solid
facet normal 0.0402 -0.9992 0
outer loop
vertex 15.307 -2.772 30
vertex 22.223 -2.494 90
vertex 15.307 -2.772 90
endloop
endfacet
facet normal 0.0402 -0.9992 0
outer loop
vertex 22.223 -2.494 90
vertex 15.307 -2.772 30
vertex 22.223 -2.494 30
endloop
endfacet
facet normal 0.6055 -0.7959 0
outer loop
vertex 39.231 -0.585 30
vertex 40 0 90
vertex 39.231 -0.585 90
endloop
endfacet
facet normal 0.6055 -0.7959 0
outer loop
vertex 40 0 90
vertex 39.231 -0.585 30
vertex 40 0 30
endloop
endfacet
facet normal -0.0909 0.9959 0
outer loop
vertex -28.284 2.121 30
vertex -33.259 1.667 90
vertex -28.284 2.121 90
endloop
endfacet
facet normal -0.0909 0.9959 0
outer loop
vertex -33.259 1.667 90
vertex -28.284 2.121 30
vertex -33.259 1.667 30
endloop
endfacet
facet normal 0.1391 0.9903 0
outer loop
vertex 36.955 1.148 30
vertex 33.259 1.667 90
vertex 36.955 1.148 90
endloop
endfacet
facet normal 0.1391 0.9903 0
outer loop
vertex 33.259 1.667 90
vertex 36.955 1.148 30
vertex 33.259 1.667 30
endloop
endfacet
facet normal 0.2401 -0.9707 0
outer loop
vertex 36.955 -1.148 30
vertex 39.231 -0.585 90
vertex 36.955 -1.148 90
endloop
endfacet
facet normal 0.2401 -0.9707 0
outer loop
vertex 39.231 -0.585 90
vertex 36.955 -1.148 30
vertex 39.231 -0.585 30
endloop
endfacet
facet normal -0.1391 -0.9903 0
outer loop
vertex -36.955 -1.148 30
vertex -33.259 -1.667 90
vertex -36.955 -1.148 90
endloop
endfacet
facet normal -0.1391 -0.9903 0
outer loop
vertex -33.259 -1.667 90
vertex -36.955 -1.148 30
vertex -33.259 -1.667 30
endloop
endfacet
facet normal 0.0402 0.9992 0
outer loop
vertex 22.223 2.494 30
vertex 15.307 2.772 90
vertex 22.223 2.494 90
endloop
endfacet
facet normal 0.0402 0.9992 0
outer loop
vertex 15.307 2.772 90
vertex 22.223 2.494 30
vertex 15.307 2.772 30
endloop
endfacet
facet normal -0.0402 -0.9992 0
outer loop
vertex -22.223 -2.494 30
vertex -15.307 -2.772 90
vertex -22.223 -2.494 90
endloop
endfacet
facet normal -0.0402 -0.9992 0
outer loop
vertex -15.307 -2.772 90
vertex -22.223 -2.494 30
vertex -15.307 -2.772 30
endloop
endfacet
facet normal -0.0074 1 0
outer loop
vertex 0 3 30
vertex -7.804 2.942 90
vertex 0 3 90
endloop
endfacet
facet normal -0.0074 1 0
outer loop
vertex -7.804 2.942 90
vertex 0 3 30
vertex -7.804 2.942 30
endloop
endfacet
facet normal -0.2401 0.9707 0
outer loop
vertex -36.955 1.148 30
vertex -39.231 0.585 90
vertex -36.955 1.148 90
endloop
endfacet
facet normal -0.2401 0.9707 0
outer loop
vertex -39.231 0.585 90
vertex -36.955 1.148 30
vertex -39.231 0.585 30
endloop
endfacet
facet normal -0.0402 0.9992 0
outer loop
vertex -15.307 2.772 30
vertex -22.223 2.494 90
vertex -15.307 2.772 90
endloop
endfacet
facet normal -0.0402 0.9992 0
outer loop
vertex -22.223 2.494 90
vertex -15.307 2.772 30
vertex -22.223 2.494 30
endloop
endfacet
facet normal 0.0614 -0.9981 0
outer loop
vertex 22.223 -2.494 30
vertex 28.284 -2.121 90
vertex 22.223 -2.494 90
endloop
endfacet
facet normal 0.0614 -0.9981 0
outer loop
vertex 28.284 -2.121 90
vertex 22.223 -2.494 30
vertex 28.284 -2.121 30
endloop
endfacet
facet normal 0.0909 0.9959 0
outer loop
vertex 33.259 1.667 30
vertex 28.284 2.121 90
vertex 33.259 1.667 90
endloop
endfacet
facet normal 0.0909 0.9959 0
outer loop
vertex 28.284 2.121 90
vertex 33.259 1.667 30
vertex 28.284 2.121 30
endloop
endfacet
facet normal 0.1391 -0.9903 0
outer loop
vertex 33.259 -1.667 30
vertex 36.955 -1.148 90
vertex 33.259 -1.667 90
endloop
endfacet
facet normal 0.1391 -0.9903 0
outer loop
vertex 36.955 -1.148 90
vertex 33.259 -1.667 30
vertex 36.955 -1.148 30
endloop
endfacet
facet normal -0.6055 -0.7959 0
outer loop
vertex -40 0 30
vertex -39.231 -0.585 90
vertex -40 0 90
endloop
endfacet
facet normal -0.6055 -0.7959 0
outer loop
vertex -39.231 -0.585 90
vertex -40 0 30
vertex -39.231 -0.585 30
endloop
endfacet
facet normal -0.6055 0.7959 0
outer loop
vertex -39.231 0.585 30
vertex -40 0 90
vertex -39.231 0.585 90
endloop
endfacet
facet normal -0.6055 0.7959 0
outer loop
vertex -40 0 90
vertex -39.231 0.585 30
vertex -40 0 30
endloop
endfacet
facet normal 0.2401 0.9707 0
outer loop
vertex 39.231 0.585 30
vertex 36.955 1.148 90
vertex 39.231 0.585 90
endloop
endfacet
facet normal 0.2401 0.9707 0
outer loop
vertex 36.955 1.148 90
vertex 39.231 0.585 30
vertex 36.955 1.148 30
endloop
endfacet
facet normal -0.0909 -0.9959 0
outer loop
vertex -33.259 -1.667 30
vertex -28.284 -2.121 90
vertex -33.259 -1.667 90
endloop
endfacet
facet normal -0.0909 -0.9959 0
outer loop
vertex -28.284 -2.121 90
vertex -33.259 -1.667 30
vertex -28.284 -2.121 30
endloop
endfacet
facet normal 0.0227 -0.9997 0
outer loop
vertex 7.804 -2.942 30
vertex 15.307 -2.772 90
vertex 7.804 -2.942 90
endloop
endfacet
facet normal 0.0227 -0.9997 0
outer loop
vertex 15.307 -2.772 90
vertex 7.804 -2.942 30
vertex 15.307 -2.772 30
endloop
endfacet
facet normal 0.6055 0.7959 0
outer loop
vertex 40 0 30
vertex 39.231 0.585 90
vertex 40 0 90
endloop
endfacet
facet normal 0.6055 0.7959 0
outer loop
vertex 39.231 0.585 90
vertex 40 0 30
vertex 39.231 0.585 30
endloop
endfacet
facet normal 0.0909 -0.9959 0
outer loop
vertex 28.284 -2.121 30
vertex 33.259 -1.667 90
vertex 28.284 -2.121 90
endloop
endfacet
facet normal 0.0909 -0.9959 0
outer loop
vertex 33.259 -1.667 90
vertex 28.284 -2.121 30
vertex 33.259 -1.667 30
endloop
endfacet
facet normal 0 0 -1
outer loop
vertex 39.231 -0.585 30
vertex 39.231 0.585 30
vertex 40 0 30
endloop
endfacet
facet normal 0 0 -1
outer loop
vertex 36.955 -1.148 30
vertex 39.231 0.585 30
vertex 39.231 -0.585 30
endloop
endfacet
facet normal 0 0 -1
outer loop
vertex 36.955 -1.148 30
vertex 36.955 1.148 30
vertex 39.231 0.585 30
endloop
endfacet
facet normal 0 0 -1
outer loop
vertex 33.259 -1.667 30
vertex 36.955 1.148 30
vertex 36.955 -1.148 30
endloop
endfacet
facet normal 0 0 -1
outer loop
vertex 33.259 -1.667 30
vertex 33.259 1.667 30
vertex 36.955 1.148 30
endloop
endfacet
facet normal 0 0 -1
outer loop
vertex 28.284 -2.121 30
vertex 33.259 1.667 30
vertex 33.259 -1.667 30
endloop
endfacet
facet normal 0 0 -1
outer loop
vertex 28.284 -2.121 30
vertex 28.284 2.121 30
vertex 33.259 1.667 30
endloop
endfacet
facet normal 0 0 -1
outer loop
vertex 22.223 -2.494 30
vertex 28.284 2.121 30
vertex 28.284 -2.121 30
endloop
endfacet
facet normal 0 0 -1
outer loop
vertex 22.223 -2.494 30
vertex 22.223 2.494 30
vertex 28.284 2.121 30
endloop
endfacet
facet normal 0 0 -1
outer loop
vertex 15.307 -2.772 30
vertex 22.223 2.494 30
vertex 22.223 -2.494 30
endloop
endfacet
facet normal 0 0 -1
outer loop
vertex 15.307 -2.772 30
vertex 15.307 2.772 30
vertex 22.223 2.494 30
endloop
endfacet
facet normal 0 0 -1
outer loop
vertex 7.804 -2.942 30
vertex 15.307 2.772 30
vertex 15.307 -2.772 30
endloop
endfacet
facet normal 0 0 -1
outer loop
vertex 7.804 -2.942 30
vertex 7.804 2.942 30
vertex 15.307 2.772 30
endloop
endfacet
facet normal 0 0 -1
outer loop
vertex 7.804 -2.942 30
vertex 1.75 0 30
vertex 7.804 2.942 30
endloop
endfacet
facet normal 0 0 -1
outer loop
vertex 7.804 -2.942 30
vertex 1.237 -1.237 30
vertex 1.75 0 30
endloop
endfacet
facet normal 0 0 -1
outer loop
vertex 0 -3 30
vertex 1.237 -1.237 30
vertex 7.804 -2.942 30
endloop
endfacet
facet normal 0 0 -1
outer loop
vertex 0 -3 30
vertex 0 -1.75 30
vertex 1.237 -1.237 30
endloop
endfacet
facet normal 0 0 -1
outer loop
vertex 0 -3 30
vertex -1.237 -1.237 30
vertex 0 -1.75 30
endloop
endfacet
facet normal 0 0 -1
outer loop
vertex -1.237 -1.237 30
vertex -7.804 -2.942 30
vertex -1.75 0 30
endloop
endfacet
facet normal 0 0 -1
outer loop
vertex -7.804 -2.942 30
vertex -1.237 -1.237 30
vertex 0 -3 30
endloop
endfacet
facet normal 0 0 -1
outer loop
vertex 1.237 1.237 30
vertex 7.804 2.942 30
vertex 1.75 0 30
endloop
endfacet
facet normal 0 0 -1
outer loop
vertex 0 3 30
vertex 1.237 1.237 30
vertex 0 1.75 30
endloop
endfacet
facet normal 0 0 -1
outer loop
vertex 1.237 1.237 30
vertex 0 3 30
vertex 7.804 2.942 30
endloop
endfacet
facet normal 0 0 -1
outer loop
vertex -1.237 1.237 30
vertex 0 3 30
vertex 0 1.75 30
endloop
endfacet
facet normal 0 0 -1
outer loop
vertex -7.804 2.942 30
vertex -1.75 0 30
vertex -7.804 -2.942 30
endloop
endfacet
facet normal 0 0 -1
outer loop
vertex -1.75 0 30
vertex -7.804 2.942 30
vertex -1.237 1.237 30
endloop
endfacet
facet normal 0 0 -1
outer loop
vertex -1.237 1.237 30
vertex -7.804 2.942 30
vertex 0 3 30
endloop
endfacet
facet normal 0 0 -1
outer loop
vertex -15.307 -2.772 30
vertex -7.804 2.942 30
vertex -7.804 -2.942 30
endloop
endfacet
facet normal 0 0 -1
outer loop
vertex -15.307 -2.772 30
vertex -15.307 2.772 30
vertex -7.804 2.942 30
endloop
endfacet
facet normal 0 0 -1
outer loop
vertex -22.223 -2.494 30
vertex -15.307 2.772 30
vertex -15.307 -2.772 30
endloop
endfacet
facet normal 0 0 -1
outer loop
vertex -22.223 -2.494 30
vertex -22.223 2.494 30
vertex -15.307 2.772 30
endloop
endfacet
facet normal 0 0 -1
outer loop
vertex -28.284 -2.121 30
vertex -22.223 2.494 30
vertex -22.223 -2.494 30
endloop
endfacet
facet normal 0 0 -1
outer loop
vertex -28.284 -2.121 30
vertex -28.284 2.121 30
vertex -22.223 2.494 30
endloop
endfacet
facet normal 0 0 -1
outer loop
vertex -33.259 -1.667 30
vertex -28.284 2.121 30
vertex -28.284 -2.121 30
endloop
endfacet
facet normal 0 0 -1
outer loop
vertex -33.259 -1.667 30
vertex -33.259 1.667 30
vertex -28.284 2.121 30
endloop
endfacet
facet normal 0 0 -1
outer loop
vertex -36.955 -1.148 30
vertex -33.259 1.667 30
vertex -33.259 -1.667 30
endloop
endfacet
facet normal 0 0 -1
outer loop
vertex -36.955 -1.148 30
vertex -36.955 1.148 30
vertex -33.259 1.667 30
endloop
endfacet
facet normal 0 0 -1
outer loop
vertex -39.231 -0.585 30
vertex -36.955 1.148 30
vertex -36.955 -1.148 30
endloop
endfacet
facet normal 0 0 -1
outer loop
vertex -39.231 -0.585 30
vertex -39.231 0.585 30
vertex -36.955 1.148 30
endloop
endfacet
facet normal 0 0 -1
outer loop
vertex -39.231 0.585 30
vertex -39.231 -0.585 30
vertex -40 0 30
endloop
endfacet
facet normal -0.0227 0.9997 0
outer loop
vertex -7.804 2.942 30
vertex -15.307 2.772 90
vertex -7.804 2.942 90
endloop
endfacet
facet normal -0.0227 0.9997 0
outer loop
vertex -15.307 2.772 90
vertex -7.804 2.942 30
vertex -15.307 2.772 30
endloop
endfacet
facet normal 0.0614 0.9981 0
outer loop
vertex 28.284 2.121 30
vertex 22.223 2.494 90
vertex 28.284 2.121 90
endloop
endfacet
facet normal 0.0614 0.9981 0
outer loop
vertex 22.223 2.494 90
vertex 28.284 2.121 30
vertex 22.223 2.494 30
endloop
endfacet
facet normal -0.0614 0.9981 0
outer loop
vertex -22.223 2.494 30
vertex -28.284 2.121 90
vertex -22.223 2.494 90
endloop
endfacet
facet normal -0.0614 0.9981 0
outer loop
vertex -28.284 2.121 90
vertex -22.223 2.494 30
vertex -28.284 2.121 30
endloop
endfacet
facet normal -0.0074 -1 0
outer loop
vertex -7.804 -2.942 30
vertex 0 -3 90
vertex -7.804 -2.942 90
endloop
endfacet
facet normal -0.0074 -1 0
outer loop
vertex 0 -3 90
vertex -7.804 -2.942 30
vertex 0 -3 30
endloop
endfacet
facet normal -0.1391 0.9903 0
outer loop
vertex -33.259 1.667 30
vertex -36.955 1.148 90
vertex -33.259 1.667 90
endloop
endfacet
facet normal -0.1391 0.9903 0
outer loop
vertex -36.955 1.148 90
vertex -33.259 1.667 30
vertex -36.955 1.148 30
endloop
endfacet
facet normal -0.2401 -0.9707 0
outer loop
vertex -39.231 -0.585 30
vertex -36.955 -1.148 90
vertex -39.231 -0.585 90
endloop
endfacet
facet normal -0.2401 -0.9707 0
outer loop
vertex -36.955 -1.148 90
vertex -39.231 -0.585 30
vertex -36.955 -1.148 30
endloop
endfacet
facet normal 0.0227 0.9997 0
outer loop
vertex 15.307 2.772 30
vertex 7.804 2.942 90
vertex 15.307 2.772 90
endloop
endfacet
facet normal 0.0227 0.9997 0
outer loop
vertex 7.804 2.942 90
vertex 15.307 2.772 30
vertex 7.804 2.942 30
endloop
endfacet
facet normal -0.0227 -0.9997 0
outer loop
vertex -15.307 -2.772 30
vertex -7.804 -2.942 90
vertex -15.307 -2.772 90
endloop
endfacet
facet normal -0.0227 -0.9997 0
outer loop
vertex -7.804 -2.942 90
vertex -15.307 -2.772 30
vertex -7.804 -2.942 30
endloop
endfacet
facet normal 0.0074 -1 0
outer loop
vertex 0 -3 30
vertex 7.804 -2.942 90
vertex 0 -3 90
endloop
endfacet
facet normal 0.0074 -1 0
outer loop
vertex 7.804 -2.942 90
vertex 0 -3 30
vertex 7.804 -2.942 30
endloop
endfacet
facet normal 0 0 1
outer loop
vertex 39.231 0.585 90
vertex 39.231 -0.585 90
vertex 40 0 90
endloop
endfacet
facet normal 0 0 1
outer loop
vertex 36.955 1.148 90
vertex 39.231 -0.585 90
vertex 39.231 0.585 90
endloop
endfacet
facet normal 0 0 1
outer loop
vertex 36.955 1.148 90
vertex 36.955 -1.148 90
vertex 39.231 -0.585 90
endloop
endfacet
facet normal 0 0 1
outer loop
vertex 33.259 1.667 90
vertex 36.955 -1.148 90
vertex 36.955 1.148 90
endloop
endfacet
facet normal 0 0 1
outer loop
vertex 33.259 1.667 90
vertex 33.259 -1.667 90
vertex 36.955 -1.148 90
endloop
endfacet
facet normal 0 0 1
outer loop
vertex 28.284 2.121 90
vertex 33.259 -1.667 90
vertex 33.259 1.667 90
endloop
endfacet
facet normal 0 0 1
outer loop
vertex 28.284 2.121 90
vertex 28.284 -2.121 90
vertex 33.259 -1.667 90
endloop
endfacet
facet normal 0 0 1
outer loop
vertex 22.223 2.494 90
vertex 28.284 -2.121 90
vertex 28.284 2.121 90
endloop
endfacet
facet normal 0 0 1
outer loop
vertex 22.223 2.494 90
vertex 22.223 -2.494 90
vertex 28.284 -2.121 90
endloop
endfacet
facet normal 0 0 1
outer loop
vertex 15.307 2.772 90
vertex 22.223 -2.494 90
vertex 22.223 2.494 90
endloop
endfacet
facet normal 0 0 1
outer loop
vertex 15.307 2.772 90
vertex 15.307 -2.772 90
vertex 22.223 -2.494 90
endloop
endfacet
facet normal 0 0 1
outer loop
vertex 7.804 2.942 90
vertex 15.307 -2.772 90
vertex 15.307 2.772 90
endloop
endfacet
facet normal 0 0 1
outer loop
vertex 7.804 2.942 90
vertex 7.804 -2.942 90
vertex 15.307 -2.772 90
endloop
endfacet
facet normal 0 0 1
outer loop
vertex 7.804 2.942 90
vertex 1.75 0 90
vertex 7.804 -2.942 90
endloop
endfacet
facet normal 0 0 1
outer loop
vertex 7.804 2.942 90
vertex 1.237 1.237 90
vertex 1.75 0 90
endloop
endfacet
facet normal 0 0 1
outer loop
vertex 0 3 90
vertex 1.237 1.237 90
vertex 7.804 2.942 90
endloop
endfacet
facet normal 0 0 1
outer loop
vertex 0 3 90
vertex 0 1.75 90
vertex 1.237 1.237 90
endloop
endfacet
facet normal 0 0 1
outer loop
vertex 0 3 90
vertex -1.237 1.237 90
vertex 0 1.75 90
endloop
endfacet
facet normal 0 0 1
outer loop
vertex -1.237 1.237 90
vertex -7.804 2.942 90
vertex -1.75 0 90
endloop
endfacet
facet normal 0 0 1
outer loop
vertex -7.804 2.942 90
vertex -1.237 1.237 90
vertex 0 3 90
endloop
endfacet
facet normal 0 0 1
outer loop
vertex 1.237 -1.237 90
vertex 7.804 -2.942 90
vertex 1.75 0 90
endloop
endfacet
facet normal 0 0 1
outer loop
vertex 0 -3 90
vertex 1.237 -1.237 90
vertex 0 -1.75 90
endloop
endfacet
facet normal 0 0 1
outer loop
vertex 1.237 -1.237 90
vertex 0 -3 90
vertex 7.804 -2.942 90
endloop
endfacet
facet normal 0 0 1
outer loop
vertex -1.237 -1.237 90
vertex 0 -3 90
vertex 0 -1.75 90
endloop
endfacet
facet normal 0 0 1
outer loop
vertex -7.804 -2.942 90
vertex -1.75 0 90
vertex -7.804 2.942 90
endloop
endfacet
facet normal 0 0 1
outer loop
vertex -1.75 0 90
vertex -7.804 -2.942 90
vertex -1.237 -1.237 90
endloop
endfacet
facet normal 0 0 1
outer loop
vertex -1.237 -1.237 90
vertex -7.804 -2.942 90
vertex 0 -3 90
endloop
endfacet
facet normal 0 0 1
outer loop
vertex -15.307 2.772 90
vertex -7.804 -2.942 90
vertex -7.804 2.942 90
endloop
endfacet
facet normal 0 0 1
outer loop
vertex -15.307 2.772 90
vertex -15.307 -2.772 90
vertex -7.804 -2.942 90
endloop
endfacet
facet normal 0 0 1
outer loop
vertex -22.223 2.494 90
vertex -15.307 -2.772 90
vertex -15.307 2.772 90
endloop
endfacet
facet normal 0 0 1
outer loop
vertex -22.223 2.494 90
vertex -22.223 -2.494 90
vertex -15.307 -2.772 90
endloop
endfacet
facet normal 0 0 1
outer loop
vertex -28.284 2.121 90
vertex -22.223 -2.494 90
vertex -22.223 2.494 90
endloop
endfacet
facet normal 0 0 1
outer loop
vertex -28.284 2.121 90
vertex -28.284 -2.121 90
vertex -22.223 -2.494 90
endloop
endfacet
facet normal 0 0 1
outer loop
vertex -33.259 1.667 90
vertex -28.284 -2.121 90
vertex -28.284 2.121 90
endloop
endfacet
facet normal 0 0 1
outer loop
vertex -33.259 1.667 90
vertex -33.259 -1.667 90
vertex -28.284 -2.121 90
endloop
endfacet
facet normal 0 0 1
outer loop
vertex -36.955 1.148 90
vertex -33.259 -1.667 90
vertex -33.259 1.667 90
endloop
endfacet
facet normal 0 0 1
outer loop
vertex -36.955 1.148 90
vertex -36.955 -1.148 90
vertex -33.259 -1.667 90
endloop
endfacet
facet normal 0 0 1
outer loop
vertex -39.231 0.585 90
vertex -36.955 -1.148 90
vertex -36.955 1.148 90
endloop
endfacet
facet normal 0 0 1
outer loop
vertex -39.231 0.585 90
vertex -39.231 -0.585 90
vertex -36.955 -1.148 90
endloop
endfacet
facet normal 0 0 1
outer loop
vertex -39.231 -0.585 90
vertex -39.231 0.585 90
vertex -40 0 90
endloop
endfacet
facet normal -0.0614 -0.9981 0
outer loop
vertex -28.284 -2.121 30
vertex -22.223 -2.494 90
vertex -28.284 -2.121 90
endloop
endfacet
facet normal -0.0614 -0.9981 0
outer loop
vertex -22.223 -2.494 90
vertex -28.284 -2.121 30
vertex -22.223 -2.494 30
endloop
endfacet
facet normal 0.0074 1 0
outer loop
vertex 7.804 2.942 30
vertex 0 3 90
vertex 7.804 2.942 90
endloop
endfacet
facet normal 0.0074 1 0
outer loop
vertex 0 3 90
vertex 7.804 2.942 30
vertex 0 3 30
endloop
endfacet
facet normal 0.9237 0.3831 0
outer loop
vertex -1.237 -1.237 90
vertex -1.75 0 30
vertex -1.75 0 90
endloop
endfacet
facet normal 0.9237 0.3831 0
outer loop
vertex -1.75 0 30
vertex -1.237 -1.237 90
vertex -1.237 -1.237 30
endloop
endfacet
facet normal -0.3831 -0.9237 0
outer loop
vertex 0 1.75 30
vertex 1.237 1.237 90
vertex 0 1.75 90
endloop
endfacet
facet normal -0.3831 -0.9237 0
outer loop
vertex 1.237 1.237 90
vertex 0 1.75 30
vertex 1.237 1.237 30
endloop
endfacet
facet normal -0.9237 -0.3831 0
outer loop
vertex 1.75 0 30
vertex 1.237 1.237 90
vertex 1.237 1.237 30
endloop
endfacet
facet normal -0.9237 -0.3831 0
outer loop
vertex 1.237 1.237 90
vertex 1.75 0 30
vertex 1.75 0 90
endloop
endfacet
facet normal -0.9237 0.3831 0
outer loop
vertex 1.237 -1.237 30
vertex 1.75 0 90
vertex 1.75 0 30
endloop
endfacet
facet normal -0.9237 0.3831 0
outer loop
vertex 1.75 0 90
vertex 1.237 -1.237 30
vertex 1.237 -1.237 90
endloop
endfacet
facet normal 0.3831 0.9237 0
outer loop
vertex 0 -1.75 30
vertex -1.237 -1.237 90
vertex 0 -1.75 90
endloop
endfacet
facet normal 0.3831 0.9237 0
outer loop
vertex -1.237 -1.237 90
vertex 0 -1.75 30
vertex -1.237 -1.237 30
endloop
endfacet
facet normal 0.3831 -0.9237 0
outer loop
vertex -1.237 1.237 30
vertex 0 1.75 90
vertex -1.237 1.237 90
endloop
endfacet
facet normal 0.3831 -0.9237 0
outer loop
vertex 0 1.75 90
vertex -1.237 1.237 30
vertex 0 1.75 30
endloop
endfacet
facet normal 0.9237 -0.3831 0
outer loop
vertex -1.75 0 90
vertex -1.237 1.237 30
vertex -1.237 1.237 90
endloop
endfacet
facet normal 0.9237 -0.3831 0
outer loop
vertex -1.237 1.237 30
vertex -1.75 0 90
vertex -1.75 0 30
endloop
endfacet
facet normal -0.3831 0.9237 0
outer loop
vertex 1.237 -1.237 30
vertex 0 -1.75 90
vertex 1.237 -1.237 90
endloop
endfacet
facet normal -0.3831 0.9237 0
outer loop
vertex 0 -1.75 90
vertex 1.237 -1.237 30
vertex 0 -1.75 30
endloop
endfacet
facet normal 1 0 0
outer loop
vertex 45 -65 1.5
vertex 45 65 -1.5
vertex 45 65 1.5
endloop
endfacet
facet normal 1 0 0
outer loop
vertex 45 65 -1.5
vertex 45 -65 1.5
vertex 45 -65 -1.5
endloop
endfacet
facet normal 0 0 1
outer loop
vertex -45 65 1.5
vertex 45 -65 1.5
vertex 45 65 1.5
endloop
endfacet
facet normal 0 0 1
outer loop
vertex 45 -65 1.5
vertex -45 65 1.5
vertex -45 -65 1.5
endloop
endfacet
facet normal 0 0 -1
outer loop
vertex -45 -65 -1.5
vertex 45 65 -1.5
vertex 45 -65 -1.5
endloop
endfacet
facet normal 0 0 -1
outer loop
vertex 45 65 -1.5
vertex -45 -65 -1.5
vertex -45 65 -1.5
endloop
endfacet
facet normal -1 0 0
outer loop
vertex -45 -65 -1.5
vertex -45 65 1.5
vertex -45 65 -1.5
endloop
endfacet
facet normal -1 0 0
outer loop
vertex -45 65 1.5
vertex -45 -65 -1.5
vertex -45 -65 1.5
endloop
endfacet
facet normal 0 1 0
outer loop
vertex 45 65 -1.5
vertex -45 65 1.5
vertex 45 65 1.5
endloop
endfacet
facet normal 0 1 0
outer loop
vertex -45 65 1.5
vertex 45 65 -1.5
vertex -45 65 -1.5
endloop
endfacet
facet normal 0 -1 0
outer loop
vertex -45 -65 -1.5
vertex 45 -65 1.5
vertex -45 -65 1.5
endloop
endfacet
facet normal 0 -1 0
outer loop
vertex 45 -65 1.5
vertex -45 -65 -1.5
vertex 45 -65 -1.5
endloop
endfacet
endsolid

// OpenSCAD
// Silikonform für Schwanzflosse (Lunate)
// Material: PLA (Negativform), 60% Infill
// Zwei Hälften: A und B
// Ergibt Silikonabguss nach Dragon Skin 10

$fn = 64;

// Parameter
span = 120;    // Spannweite (mm)
chord = 80;    // Chord (mm)
thickness = 12; // Max dicke (mm, NACA 0010)
cfc_hole = 3.5; // CFK-Kern-Kanal Ø

module naca_0010_profile() {
    // Approximation NACA 0010 Profil
    scale([chord, thickness/2, 1])
        circle(r=0.5, $fn=32);
}

module caudal_fin_half() {
    difference() {
        union() {
            // Halbe Form
            translate([0, 0, span/4])
                linear_extrude(height=span/2)
                    naca_0010_profile();
        }
        // CFK-Kanal
        cylinder(h=span, r=cfc_hole/2, $fn=8);
    }
}

module form_flansch() {
    // Flache Flansch-Fläche zum Zusammenfügen
    cube([chord+10, span+10, 3], center=true);
}

// ASSEMBLY
union() {
    caudal_fin_half();
    form_flansch();
}
